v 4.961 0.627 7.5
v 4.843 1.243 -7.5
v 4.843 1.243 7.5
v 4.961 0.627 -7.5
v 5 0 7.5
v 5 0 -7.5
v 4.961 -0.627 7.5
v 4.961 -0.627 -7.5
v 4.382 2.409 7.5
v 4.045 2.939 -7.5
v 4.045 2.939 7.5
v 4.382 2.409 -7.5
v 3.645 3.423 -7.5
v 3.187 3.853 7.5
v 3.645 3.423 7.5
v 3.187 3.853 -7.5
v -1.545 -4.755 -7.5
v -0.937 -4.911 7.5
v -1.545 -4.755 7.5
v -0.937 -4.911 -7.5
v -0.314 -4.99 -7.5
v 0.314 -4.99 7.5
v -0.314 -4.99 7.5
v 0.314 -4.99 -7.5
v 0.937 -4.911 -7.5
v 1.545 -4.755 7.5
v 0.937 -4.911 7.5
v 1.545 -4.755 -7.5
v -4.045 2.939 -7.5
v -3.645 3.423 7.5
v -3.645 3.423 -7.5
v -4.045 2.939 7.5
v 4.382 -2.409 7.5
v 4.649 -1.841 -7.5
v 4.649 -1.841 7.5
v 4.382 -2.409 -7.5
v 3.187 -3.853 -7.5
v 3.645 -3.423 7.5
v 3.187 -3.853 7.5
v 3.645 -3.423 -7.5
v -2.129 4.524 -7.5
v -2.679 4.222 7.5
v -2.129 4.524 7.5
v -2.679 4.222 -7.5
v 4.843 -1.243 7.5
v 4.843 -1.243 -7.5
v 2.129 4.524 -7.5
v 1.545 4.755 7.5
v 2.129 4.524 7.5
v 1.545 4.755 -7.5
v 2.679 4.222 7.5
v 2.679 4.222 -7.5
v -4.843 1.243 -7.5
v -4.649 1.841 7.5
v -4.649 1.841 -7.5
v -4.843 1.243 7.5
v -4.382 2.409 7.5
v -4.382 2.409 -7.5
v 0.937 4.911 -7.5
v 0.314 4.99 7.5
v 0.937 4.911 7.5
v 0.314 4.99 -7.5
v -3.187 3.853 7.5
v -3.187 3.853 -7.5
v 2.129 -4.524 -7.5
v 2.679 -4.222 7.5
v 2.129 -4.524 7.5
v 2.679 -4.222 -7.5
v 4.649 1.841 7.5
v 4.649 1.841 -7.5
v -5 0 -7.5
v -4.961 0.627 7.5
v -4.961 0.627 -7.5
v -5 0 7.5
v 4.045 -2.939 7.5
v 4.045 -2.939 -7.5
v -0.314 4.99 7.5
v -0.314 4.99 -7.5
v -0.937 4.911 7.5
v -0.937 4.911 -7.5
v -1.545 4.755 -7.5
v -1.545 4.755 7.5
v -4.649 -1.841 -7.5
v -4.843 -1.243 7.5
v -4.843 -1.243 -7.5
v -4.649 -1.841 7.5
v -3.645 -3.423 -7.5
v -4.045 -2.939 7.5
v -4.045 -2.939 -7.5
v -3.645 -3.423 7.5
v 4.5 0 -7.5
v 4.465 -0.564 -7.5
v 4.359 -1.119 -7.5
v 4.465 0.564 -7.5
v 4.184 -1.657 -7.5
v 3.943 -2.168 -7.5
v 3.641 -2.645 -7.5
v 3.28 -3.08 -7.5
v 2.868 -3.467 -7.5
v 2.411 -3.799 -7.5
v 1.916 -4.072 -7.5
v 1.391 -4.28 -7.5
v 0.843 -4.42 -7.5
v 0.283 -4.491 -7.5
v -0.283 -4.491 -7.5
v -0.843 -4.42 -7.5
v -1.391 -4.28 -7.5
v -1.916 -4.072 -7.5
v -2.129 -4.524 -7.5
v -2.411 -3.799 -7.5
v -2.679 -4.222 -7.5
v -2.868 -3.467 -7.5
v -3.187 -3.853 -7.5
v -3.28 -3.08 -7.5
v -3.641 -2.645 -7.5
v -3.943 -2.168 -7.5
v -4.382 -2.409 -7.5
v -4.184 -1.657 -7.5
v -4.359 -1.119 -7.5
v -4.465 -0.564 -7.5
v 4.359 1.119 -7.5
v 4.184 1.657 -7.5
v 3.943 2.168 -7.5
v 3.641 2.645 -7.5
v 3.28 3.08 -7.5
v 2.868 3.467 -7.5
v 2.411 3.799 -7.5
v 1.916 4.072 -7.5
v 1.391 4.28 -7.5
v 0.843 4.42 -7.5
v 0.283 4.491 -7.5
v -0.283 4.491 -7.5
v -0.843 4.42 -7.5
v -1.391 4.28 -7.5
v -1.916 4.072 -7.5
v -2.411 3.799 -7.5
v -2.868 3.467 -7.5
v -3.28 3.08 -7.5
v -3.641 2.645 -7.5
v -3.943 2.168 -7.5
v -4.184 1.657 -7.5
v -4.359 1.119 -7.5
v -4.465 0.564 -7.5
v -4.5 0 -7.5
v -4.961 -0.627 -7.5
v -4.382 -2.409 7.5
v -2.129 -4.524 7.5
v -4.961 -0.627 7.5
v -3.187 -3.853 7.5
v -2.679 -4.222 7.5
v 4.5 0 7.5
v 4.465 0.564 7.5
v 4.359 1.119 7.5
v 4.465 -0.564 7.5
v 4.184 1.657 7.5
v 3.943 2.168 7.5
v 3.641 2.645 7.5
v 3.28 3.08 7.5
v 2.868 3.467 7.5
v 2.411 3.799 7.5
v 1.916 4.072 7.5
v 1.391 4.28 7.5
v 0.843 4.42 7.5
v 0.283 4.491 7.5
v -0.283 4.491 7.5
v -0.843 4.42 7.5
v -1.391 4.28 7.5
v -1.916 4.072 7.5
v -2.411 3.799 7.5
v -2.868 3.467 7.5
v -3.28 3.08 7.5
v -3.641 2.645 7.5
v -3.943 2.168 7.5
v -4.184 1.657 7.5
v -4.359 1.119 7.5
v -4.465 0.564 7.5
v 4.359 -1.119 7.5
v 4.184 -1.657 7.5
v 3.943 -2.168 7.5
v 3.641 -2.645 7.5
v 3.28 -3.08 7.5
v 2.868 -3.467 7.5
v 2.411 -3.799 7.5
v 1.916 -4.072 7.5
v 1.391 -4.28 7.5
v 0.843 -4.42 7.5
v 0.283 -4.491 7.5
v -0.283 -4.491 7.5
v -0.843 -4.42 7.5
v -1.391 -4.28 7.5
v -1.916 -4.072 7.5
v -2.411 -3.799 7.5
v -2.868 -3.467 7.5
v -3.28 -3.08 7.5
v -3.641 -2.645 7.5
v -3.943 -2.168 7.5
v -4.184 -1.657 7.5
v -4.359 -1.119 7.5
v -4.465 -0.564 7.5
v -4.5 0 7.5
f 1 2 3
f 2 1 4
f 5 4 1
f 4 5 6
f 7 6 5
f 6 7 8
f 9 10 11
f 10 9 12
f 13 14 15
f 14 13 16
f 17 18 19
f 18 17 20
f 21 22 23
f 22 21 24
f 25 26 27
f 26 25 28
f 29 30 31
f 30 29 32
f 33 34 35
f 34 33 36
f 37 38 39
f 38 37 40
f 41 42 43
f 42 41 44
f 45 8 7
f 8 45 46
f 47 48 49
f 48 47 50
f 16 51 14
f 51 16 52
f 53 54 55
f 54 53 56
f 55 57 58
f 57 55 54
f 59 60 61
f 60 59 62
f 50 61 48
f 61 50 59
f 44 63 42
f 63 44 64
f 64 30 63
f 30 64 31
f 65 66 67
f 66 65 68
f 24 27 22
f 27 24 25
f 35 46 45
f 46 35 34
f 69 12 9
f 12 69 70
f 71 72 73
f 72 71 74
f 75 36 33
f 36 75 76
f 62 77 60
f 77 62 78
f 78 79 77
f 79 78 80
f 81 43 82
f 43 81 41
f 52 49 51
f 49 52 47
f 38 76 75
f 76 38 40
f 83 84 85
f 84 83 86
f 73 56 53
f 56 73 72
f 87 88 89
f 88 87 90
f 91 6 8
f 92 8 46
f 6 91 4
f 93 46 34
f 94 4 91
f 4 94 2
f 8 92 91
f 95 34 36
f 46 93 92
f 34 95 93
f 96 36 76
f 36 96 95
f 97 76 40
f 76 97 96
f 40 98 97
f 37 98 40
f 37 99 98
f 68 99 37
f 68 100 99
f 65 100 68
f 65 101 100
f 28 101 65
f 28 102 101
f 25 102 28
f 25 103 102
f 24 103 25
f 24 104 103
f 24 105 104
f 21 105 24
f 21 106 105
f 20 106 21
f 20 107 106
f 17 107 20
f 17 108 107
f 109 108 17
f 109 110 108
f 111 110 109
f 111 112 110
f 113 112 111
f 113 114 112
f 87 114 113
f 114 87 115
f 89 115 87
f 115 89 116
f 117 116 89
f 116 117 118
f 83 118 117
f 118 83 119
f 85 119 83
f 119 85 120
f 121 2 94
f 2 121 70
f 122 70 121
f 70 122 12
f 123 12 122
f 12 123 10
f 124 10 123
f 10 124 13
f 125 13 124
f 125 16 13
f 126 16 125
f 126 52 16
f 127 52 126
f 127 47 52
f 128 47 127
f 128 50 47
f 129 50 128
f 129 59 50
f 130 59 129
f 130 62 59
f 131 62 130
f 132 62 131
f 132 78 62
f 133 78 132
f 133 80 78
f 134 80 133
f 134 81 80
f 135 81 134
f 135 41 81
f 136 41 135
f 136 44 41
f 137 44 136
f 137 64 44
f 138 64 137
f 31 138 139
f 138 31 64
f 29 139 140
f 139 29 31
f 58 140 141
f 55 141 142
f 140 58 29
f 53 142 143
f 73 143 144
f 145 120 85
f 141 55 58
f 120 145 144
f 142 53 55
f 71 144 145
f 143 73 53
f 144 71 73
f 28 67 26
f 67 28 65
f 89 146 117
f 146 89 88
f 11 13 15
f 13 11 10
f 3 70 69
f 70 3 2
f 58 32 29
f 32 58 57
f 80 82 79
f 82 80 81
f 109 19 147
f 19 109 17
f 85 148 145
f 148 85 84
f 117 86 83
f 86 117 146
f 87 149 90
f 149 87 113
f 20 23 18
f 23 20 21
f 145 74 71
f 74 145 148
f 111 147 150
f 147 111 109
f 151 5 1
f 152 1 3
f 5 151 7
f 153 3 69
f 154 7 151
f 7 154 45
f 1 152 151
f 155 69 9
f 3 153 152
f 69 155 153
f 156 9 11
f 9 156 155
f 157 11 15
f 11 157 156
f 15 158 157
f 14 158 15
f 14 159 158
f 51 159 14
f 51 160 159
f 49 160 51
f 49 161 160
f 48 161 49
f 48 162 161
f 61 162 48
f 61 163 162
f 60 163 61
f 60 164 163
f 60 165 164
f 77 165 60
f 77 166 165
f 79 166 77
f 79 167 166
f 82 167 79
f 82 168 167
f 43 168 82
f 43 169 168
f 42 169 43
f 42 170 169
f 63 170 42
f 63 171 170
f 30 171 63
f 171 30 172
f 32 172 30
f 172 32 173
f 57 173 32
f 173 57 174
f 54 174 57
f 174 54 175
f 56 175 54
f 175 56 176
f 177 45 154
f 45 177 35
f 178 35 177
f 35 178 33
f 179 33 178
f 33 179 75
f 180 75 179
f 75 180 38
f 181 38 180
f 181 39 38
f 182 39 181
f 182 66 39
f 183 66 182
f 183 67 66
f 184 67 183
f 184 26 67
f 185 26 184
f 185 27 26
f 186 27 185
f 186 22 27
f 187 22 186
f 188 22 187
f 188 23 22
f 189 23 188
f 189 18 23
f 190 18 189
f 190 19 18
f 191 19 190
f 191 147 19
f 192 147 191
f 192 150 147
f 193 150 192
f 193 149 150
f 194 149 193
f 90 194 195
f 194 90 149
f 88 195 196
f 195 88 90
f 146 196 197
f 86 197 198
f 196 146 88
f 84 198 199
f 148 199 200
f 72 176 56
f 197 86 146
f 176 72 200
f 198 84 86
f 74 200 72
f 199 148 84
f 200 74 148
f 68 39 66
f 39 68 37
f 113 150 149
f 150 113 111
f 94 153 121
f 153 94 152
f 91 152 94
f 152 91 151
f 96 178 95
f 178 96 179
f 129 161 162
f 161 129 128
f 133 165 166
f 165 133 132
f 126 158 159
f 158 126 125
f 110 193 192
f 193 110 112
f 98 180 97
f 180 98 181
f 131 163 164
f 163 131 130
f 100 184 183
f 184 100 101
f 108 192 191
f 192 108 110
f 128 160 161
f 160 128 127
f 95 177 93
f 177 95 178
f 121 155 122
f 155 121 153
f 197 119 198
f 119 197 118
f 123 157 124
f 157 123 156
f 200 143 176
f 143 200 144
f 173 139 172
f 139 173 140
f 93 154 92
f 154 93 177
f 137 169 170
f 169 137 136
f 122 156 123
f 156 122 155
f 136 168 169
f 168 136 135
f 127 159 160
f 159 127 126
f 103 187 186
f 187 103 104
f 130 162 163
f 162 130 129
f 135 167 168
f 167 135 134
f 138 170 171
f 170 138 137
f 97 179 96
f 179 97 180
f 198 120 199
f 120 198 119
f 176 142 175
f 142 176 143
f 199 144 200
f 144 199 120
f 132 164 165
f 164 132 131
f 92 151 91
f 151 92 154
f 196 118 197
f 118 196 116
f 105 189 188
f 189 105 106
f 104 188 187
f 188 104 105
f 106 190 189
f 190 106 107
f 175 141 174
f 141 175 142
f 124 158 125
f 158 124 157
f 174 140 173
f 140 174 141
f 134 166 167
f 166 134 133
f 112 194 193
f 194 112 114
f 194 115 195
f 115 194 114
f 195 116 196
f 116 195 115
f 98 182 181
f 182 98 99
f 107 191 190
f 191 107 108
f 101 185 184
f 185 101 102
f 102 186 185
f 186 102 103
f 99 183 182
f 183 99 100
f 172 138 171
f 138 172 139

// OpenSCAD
$fn = 50;


difference() {
	union() {
		translate(v = [0, 0, -7.5000000000]) {
			cylinder(h = 15, r = 5.0000000000);
		}
	}
	union() {
		translate(v = [0, 0, -100.0000000000]) {
			cylinder(h = 200, r = 4.5000000000);
		}
	}
}
